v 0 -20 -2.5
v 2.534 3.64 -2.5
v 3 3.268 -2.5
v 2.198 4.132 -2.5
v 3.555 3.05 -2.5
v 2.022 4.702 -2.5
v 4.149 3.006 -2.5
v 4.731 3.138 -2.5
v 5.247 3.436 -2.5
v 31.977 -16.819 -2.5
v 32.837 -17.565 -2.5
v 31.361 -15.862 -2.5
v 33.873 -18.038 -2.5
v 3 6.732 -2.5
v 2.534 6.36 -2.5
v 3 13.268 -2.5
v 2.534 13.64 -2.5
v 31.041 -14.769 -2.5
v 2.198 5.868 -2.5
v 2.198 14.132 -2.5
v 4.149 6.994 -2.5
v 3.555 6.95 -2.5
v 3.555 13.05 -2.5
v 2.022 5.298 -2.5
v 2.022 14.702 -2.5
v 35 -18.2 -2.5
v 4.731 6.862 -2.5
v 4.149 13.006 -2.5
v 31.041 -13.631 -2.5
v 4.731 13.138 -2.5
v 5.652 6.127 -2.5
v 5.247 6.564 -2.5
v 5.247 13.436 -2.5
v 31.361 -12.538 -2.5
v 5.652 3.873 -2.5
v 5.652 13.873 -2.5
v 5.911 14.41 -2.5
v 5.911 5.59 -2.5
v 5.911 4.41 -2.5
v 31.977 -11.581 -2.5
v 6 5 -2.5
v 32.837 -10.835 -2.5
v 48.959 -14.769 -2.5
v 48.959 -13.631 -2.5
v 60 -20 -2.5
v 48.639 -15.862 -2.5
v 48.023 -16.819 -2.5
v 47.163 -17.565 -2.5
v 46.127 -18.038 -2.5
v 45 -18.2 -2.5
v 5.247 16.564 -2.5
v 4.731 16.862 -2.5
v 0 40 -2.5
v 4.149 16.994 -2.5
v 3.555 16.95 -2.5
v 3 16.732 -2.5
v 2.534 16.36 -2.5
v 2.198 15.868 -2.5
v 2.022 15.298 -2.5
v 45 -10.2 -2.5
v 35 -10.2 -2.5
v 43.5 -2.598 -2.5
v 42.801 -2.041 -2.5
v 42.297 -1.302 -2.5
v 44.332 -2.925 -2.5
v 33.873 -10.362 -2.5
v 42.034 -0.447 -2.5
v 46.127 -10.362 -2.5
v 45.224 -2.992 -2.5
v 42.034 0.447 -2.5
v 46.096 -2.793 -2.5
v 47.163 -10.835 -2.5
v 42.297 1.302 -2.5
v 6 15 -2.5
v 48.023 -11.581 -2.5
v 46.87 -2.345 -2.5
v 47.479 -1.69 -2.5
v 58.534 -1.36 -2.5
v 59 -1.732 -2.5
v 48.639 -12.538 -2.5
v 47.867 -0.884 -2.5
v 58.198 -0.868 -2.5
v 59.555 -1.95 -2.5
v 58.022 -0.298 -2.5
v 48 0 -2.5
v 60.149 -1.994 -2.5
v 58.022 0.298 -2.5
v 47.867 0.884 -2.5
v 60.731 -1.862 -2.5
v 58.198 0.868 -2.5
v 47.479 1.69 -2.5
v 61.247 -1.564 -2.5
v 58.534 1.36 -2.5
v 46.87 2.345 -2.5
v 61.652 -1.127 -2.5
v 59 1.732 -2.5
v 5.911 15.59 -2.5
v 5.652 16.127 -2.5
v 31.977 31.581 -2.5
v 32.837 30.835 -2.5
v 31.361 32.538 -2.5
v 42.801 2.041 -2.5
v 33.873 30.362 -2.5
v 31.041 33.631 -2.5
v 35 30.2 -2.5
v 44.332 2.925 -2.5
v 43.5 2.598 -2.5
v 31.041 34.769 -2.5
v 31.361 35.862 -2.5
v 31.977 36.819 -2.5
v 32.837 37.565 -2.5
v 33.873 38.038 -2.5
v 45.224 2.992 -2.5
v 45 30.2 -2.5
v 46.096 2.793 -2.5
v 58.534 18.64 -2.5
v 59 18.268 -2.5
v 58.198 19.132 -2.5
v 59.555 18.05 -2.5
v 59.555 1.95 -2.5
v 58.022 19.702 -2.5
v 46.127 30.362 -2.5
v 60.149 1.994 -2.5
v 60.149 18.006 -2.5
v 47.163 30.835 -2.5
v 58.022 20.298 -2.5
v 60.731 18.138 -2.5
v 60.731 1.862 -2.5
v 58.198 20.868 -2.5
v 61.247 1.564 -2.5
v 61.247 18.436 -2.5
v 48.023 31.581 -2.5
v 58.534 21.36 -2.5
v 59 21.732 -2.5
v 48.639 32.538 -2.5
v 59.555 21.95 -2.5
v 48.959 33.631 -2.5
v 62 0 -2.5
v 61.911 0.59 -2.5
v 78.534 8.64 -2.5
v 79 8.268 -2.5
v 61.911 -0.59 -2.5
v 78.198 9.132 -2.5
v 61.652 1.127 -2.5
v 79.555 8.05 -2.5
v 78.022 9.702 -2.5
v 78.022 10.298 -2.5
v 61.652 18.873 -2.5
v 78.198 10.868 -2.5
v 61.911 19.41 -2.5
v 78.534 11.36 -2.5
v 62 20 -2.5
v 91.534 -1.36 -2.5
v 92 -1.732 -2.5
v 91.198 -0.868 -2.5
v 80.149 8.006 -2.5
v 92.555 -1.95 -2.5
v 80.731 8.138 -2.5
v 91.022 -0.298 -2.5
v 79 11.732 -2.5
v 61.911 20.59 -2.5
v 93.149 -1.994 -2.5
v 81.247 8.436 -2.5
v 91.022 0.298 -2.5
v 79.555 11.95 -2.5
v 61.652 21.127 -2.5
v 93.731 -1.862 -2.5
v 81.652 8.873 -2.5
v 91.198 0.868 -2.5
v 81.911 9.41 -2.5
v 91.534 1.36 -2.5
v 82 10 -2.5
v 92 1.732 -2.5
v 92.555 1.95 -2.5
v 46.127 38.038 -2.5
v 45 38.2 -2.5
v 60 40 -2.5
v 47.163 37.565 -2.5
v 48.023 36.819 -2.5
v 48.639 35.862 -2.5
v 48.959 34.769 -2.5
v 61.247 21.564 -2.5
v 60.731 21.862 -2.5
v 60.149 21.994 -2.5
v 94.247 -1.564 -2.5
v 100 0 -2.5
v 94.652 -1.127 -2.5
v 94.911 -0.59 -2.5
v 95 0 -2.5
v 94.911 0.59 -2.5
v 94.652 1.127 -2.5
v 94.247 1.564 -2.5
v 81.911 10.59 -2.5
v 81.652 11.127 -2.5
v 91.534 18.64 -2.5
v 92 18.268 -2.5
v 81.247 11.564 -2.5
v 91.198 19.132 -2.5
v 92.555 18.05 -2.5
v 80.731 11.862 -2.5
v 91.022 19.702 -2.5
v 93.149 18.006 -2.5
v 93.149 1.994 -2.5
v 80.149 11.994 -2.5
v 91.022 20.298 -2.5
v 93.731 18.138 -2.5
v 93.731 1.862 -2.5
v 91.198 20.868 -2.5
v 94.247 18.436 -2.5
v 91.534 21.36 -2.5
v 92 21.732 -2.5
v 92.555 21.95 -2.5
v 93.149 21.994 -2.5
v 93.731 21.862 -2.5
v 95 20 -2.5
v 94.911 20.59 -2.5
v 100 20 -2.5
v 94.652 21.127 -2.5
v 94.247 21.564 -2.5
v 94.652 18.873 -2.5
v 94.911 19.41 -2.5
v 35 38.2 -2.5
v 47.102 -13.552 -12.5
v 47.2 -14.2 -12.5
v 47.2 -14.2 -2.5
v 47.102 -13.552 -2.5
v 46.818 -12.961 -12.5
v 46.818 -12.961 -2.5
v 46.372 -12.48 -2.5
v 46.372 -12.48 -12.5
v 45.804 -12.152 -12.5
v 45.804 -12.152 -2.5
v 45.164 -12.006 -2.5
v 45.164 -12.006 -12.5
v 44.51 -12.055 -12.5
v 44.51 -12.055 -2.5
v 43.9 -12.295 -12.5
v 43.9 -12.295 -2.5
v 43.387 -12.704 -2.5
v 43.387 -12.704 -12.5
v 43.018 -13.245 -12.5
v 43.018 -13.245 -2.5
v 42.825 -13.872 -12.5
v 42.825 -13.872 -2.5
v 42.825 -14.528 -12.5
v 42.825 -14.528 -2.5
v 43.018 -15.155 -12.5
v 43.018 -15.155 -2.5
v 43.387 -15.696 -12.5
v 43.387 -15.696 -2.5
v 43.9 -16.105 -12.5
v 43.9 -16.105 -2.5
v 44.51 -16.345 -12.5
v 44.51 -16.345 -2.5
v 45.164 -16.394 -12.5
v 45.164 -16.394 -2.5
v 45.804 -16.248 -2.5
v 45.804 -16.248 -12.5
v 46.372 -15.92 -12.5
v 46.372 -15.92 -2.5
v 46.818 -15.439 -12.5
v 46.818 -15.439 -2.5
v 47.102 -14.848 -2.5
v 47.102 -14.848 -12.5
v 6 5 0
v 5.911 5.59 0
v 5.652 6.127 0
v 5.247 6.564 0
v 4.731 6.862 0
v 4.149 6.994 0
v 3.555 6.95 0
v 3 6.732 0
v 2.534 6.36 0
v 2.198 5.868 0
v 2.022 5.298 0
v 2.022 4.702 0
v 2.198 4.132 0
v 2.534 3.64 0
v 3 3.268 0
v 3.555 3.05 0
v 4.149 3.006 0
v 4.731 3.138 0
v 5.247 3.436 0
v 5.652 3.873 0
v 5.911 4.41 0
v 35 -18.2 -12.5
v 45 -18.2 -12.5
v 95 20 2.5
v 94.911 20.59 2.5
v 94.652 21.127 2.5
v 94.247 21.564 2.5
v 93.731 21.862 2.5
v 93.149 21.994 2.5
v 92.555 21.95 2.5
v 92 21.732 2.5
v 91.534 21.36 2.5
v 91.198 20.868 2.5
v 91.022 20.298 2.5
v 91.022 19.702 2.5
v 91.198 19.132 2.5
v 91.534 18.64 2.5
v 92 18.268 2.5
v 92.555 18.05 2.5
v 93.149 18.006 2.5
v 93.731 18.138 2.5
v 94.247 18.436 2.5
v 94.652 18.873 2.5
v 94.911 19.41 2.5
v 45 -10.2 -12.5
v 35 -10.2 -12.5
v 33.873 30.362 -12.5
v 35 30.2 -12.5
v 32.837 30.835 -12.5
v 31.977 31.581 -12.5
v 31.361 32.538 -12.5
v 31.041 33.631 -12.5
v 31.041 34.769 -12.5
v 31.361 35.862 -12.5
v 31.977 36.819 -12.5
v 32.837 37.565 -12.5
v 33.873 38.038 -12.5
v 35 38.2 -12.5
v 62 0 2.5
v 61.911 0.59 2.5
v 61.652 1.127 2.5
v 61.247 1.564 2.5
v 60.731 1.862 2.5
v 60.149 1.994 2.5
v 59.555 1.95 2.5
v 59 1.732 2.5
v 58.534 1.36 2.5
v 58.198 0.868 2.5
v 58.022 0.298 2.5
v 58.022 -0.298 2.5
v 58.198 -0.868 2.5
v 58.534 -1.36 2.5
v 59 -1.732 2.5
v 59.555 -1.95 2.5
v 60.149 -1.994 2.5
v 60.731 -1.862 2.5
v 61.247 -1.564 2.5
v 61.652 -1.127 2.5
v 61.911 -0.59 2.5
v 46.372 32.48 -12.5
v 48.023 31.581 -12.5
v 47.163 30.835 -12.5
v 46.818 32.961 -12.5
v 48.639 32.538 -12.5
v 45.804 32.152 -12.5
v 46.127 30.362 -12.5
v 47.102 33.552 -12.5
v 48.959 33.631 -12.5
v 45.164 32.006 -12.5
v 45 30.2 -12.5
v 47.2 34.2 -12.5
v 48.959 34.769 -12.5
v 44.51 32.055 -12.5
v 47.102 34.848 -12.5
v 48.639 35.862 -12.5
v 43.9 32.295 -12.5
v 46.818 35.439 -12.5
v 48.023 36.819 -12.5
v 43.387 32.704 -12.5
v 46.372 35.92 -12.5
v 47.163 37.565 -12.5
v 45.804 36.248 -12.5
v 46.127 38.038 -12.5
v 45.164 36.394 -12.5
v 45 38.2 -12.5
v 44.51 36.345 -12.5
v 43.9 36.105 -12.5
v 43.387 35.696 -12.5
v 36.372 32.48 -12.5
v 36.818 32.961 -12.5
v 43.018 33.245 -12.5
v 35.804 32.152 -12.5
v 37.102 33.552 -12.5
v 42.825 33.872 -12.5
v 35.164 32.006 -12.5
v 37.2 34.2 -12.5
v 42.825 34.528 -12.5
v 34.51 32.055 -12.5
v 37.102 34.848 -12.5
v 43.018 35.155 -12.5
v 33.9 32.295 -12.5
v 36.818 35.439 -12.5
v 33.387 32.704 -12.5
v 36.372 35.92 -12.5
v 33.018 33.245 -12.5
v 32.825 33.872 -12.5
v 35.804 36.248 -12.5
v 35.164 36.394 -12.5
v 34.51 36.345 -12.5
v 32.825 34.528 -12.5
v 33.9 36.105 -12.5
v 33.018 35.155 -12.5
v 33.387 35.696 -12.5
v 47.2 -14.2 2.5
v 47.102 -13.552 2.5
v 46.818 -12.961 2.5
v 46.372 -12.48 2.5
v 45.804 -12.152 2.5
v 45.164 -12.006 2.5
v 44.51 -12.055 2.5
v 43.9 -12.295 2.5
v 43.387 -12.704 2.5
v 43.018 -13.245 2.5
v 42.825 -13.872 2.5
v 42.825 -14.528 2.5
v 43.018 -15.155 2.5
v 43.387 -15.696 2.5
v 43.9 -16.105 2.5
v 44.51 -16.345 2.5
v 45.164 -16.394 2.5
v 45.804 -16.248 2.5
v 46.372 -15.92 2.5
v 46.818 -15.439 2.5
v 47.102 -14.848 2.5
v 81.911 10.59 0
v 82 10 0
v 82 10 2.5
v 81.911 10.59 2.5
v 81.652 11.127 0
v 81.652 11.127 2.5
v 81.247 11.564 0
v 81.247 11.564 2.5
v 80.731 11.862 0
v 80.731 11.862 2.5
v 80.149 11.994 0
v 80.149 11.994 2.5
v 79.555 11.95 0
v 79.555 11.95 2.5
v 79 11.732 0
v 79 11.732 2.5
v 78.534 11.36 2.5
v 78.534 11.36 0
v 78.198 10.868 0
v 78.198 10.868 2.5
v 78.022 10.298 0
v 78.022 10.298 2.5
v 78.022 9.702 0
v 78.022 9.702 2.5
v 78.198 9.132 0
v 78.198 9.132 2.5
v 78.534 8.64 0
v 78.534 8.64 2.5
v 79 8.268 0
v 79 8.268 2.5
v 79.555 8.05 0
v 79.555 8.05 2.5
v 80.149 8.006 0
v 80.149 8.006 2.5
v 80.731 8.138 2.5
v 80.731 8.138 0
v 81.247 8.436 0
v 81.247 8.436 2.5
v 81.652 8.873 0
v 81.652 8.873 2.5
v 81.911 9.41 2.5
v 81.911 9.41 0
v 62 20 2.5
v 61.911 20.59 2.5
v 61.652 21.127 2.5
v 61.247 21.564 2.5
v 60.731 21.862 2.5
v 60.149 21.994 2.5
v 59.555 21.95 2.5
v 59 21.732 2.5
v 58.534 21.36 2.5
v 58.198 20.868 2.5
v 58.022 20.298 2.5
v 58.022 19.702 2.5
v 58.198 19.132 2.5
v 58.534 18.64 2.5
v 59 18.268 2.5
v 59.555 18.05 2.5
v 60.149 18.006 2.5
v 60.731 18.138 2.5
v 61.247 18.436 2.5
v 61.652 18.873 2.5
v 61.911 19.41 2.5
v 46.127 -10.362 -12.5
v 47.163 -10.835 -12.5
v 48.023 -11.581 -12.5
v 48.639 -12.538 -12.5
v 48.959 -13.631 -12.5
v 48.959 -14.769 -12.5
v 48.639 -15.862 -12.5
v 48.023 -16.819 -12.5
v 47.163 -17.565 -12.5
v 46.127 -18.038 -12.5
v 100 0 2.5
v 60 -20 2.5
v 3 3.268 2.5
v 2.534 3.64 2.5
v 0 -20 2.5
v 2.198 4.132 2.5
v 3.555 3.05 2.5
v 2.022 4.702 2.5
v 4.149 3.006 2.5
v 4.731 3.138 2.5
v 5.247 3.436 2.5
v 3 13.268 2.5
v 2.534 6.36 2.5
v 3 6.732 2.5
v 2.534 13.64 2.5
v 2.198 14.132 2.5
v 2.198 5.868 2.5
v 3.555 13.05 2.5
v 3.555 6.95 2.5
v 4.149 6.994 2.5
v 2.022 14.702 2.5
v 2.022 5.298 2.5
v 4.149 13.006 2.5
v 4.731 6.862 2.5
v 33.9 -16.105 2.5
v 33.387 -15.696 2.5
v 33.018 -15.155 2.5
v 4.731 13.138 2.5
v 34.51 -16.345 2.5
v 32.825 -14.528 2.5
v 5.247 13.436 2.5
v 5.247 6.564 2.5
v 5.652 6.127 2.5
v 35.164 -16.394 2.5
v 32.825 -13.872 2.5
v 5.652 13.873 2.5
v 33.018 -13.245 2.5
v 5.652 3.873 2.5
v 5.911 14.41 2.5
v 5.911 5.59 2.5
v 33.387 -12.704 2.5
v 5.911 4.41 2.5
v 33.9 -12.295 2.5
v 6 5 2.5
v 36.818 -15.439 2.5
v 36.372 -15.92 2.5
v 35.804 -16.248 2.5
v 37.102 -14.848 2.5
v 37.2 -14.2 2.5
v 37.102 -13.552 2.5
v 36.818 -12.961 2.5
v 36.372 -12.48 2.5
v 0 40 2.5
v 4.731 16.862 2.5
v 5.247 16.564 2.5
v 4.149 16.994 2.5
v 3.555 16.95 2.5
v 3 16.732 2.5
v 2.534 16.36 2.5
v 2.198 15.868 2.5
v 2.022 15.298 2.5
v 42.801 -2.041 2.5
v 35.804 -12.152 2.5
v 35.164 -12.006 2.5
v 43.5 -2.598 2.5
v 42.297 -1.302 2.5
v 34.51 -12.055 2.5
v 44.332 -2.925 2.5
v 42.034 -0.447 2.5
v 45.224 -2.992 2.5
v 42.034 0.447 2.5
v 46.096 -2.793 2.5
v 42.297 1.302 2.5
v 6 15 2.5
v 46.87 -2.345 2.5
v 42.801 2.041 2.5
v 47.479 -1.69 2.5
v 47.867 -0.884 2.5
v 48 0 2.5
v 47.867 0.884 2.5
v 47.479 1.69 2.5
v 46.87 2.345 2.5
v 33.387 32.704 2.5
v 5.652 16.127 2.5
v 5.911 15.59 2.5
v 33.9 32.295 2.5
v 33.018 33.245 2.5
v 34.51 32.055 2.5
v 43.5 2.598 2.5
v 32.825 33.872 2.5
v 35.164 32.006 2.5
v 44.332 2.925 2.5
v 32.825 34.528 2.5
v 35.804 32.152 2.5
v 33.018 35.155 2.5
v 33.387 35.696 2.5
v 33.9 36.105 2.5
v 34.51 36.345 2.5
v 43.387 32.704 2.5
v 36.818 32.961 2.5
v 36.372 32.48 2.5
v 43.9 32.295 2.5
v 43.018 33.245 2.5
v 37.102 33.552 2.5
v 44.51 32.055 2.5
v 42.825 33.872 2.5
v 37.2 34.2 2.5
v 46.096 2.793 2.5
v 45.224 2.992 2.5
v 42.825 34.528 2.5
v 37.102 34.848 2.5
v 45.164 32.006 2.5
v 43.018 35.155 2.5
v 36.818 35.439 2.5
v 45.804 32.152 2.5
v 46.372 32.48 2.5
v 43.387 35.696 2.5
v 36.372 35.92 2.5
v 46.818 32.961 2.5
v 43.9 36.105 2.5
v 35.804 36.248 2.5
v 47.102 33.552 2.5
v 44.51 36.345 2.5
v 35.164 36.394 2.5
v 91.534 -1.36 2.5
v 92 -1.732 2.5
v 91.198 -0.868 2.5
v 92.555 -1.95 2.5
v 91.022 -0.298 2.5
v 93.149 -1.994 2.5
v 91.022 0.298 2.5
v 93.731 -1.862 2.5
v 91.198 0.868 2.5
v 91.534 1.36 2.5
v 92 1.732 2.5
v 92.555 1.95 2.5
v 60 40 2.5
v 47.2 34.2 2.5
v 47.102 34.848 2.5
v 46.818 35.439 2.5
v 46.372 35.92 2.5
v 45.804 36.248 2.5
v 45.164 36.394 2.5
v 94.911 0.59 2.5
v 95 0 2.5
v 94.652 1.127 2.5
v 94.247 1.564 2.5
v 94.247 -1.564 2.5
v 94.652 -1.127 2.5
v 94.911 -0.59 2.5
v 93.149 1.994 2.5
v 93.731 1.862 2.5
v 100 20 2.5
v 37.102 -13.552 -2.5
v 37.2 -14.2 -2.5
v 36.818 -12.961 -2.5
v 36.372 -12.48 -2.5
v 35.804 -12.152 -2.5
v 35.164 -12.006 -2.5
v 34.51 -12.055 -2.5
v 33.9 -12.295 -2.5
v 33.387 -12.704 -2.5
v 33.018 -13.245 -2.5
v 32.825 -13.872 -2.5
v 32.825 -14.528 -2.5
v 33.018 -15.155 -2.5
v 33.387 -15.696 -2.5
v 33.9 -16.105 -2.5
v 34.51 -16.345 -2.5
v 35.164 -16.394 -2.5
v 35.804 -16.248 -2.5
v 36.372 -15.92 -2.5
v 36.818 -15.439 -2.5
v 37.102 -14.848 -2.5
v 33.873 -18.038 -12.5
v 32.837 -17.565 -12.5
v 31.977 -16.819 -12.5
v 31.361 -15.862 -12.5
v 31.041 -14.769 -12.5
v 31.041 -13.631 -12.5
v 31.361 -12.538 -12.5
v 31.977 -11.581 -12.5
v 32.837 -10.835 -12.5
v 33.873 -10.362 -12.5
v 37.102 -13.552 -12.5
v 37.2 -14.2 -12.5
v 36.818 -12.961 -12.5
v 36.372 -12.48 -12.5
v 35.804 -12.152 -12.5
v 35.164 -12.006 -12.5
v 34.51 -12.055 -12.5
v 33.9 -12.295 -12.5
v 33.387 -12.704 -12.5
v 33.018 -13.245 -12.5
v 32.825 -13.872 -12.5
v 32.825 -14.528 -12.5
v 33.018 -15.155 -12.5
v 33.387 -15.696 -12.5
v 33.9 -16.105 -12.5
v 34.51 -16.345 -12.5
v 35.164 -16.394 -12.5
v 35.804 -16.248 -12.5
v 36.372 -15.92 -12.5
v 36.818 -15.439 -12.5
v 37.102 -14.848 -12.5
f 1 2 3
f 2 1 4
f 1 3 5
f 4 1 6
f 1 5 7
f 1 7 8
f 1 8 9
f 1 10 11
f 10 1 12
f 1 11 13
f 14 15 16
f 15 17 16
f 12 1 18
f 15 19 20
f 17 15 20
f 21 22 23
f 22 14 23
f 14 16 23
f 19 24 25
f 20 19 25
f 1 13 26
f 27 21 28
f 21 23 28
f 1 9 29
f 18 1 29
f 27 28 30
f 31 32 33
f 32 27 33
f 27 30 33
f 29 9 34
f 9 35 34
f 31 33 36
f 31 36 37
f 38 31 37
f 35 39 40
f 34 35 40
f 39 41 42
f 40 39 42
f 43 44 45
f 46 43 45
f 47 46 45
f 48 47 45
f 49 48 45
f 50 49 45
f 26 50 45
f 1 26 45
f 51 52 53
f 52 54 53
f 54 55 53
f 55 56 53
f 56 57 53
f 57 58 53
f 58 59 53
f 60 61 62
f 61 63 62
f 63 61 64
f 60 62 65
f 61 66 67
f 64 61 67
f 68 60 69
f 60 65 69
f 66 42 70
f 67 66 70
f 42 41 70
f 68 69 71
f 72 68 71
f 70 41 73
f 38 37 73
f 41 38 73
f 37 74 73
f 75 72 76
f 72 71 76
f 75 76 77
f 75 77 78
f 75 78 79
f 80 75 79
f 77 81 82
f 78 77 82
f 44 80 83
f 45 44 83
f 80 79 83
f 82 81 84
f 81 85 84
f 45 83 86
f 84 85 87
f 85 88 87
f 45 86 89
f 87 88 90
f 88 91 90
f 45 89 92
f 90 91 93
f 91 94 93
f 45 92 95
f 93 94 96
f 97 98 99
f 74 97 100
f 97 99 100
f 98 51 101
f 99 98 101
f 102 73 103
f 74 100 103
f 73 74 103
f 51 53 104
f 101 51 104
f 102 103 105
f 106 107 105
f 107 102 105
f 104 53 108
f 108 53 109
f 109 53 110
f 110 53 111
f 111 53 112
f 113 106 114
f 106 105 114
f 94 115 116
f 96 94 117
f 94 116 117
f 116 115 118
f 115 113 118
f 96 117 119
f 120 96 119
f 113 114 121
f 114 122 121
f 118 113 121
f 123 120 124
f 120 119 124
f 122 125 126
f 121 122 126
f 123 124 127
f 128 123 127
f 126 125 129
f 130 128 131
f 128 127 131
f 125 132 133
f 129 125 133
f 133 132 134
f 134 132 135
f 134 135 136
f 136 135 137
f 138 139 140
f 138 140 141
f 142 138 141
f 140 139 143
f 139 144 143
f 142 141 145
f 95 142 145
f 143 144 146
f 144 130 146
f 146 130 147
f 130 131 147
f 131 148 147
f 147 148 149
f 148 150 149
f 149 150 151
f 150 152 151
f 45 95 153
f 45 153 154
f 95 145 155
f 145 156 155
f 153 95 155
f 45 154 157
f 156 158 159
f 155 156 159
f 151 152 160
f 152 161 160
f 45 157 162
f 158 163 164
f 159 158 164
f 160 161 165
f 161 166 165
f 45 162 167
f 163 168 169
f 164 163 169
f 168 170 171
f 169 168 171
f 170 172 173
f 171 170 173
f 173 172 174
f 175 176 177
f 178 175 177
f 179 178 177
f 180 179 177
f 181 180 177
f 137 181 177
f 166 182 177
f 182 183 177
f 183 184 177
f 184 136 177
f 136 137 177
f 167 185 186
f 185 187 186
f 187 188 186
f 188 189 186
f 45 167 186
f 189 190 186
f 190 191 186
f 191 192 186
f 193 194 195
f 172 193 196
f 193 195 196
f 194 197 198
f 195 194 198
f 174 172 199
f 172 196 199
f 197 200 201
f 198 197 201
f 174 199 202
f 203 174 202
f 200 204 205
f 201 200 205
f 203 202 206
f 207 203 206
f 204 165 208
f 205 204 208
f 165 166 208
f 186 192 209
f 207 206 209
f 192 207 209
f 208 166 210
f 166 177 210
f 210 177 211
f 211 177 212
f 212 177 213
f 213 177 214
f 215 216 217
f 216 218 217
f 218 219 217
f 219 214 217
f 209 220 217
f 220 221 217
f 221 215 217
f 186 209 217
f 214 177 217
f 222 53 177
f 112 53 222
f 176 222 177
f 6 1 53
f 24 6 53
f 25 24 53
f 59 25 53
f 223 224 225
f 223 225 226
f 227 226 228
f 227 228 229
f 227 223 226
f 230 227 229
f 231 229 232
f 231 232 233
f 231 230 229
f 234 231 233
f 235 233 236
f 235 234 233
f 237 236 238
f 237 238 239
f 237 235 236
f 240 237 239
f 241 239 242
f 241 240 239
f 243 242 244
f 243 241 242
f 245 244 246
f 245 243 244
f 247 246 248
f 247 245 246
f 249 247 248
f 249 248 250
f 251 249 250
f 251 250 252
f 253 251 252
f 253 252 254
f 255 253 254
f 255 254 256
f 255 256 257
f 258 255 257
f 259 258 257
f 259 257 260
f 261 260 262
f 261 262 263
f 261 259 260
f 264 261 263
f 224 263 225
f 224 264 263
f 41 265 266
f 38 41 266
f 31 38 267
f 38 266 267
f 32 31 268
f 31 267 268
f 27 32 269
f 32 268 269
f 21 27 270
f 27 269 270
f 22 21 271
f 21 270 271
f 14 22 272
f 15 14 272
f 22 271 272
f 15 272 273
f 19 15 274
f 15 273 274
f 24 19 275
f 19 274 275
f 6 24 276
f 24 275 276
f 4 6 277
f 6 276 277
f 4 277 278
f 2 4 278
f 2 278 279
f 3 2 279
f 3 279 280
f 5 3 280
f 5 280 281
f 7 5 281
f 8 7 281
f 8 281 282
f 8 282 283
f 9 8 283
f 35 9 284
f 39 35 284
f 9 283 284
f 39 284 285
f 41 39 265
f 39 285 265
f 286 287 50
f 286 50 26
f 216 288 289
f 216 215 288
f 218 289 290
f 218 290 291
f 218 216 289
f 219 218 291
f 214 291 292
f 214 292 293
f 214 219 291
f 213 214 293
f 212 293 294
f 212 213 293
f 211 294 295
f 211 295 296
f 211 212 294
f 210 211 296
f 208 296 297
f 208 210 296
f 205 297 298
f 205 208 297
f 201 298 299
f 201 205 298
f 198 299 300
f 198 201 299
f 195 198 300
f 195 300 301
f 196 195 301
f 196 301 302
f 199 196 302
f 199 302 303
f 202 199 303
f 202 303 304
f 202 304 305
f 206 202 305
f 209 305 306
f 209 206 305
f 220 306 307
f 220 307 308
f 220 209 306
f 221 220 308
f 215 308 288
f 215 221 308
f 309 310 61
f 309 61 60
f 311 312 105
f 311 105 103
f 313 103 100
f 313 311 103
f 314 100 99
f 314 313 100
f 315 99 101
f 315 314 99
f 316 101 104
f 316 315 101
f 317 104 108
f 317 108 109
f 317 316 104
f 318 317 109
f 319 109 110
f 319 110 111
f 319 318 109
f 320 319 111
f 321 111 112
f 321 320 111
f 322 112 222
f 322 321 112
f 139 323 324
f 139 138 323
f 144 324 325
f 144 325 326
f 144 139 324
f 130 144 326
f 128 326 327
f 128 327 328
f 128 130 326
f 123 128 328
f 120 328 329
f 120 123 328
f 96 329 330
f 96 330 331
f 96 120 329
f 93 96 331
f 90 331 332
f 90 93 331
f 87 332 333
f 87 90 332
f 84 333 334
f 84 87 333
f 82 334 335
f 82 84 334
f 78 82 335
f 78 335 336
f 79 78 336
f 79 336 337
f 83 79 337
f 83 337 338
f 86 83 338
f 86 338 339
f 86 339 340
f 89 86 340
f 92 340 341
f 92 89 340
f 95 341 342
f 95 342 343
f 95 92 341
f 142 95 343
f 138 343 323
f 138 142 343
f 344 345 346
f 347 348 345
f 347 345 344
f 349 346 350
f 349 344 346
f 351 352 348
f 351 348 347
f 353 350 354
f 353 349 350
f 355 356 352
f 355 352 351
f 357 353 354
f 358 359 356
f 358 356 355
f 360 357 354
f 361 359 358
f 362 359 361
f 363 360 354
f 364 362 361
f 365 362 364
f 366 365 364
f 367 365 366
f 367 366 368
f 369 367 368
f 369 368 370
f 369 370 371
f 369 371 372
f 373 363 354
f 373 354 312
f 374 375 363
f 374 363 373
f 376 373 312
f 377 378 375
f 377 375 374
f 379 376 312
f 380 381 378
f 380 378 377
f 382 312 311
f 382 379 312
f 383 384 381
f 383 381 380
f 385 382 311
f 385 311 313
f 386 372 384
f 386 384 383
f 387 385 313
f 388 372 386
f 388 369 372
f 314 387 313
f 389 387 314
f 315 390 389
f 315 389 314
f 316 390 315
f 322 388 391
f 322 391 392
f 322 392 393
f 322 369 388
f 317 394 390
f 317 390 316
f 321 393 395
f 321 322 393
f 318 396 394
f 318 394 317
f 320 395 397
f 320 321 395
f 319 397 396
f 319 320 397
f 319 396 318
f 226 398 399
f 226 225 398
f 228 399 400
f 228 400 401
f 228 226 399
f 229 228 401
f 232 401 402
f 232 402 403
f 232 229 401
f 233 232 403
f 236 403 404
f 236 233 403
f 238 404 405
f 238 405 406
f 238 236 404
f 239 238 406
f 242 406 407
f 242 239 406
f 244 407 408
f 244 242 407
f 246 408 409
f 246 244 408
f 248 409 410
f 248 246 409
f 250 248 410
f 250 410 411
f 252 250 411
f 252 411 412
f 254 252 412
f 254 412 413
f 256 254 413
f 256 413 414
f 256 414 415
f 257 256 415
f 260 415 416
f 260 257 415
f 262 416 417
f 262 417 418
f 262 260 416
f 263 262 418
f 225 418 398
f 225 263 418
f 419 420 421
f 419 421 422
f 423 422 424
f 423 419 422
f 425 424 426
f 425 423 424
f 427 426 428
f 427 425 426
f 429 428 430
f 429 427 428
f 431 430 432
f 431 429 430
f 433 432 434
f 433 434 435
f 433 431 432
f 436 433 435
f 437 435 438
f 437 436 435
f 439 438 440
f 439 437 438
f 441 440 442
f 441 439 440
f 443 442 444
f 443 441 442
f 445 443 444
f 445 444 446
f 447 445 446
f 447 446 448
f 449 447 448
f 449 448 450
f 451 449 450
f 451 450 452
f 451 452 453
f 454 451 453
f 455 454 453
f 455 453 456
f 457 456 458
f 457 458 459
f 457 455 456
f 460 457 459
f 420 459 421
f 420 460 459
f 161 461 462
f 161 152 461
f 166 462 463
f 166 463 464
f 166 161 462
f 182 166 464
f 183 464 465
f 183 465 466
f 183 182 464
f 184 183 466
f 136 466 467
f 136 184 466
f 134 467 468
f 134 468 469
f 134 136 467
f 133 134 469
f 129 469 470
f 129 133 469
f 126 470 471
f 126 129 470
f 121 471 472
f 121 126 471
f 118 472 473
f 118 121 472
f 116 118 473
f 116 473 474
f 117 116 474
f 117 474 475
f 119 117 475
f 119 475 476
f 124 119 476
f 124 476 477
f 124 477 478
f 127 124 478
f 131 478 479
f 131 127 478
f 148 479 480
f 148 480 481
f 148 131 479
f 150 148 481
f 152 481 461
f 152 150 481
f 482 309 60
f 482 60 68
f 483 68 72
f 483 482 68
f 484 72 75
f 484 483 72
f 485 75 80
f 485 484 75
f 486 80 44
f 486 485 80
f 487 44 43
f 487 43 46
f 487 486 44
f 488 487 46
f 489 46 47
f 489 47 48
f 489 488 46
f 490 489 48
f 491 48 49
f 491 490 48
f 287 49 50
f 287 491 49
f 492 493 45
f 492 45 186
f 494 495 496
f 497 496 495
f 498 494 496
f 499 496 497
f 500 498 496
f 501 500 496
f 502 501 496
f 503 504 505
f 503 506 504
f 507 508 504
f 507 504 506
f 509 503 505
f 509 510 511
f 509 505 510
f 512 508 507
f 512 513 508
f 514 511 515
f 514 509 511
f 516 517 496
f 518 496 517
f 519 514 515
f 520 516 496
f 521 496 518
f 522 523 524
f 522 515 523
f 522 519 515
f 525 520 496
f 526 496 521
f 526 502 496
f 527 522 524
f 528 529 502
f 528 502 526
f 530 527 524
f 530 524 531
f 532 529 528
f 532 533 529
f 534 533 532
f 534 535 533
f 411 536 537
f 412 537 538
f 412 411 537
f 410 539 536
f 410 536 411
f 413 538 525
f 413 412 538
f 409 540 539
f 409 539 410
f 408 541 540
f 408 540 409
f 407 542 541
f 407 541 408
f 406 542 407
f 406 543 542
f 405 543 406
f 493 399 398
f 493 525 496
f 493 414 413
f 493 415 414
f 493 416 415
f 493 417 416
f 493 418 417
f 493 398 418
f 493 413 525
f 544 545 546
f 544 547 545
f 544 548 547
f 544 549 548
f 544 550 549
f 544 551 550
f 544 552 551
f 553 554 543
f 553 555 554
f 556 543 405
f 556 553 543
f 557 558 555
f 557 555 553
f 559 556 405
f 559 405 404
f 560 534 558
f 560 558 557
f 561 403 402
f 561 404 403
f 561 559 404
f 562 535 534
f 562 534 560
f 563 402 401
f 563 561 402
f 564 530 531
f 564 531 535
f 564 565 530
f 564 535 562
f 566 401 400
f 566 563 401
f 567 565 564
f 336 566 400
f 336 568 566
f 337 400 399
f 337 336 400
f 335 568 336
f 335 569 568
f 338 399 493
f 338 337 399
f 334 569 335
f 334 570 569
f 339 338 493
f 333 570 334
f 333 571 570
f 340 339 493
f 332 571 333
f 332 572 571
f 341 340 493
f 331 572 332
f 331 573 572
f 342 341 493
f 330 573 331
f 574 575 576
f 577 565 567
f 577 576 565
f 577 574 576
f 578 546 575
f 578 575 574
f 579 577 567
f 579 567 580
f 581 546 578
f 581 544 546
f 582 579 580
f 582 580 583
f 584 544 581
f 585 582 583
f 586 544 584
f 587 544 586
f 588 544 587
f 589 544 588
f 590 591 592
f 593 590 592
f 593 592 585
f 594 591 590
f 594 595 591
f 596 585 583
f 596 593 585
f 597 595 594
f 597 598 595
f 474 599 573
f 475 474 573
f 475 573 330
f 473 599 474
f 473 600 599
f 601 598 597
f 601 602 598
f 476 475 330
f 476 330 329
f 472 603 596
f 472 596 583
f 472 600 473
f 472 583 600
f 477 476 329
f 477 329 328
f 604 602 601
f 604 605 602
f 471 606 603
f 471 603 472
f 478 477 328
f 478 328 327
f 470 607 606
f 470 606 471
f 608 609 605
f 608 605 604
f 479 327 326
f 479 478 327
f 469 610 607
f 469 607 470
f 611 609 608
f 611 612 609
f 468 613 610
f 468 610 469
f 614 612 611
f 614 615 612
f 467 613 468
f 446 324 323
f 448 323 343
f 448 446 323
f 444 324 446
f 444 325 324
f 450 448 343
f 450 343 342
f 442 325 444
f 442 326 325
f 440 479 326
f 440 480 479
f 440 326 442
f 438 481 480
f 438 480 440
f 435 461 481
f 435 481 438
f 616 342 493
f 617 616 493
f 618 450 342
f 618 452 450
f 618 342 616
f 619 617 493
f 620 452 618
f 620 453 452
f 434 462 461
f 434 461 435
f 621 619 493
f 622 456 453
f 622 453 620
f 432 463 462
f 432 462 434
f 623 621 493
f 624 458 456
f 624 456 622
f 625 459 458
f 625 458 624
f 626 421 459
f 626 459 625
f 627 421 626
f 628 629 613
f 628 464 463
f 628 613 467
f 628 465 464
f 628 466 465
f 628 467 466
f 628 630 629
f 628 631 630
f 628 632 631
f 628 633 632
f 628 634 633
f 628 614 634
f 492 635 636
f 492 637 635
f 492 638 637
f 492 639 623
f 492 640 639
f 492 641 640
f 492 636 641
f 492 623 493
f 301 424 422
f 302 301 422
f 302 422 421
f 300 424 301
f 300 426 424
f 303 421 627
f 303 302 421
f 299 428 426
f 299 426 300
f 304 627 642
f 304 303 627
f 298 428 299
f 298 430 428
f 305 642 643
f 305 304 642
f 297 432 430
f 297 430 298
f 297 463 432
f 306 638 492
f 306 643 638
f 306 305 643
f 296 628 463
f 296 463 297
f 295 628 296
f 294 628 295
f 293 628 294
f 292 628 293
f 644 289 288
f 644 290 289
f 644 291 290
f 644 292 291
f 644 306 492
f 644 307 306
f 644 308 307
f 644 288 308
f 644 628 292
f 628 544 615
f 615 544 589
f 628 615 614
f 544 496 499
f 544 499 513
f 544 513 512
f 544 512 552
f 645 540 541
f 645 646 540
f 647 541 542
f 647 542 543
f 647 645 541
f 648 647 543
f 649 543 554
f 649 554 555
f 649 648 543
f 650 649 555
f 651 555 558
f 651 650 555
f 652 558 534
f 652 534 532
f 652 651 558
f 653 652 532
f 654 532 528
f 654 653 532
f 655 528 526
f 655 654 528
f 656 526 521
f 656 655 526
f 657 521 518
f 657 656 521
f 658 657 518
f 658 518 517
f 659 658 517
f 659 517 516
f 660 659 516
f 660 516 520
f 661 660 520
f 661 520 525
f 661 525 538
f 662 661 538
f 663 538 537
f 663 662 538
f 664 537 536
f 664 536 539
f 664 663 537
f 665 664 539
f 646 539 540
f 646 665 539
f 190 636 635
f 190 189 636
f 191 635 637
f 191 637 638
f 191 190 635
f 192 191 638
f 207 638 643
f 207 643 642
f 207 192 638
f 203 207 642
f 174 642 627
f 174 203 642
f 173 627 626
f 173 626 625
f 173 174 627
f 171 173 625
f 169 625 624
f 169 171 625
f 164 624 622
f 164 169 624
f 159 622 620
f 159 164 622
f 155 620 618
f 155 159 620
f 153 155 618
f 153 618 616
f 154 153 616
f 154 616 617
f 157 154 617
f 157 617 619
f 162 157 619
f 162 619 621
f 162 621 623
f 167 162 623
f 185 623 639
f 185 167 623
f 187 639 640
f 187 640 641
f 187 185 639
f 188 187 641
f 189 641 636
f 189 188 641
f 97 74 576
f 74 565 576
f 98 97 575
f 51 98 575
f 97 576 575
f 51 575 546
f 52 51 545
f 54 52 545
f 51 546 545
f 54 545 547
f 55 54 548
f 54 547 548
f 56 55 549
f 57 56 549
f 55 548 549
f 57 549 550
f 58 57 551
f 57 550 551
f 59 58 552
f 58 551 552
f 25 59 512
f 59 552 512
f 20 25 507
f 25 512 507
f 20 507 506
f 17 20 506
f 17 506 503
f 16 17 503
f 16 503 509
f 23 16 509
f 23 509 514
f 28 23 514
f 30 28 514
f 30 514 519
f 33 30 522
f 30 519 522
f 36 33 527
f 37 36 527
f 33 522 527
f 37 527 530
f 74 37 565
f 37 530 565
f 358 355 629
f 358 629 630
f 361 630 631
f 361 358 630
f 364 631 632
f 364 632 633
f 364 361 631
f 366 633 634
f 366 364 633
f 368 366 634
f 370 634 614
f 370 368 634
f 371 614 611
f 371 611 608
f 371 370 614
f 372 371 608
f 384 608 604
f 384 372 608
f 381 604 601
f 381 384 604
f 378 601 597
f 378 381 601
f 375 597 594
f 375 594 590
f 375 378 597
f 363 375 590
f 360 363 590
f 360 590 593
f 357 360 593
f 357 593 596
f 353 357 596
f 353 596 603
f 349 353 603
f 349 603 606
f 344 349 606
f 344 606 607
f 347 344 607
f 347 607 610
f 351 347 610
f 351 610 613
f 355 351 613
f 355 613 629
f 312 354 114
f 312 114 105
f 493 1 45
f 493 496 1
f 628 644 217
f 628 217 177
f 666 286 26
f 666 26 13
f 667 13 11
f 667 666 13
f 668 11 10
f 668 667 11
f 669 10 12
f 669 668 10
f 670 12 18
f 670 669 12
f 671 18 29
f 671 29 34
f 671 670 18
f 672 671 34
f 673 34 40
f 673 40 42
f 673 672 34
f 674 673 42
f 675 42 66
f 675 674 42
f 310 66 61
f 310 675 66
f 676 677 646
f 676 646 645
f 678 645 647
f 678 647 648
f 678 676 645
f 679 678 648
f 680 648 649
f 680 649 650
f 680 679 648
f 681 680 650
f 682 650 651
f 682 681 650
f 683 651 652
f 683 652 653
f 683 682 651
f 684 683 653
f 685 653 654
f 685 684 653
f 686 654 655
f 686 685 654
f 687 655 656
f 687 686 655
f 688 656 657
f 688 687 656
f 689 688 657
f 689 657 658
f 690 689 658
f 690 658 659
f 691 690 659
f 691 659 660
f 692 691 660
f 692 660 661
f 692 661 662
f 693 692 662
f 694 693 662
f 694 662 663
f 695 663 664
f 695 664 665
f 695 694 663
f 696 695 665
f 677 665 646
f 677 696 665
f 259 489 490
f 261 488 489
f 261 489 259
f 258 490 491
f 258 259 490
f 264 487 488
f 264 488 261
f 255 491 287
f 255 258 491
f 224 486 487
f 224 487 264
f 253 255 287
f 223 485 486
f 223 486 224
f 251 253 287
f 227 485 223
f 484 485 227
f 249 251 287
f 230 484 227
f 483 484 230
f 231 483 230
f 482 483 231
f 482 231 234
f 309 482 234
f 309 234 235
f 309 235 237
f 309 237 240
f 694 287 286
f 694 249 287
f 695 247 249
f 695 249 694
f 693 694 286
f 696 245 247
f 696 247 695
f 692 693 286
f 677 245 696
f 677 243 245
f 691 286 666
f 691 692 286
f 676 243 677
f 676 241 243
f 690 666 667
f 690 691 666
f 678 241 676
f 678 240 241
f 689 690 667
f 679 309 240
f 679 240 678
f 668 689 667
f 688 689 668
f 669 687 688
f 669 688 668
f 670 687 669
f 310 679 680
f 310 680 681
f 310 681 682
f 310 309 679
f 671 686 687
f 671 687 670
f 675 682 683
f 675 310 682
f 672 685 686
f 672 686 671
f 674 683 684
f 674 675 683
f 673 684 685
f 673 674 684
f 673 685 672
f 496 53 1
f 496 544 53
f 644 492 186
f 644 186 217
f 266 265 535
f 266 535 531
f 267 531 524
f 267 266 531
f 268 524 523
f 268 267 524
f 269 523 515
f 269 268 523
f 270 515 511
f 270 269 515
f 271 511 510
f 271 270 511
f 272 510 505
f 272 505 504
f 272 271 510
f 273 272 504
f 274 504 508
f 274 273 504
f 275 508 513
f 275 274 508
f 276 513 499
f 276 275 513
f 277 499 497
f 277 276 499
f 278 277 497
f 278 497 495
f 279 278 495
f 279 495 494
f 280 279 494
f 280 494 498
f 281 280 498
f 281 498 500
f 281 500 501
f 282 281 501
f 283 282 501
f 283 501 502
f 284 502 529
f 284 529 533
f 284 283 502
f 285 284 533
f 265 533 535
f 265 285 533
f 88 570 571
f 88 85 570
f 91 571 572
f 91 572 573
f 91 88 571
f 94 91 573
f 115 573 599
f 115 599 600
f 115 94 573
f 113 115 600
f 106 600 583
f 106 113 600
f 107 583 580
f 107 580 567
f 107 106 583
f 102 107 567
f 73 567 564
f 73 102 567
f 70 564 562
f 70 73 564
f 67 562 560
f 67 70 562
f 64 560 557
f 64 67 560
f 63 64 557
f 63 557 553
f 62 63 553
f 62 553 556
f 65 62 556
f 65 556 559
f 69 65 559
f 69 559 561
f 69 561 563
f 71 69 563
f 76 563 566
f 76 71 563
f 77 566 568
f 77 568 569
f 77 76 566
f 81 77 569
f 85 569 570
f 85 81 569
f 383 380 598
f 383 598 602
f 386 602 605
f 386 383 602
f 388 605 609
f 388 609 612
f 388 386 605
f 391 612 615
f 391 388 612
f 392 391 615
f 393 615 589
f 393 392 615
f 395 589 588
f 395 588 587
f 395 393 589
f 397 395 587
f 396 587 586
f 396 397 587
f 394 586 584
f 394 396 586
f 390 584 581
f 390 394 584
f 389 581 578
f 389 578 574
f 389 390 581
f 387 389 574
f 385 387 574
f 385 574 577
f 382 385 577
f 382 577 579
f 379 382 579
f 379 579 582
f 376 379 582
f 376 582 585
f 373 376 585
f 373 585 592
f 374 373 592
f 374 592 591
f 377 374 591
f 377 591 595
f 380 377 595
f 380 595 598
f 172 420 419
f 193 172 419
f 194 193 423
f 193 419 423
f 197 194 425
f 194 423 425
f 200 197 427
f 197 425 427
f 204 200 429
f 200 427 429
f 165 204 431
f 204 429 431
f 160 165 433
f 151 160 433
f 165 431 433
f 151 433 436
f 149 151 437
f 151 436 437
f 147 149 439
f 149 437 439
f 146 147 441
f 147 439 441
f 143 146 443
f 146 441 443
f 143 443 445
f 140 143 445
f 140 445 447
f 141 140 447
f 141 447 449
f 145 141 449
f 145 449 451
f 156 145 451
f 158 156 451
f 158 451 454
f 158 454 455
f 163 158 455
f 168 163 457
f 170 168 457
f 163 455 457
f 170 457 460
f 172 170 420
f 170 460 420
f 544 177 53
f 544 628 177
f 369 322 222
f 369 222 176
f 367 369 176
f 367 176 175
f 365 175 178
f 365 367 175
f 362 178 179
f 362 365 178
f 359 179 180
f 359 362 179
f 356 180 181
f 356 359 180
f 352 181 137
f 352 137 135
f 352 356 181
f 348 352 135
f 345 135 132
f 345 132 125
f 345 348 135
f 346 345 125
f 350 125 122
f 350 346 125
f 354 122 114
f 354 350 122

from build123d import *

# Parameters (mm, degrees)
SKETCH_1_R          = 2
SKETCH_1_R_2        = 3
SKETCH_1_R_3        = 2.2
EXTRUDE_1_DEPTH     = 2.5
SKETCH_2_R          = 2
CUT_EXTRUDE_1_DEPTH = 2.5
EXTRUDE_START       = -15
SKETCH_3_R          = 2.2
EXTRUDE_2_DEPTH     = 10


with BuildPart() as part:
    # 草图1 → 凸台-拉伸1 (new, symmetric)
    with BuildSketch(Plane.XY):
        Polygon((0, -20), (60, -20), (100, 0), (100, 20), (60, 40), (0, 40), align=None)
        with Locations((60, 20)):
            Circle(SKETCH_1_R, mode=Mode.SUBTRACT)
        with Locations((60, 0)):
            Circle(SKETCH_1_R, mode=Mode.SUBTRACT)
        with Locations((93, 20)):
            Circle(SKETCH_1_R, mode=Mode.SUBTRACT)
        with Locations((93, 0)):
            Circle(SKETCH_1_R, mode=Mode.SUBTRACT)
        with Locations((45, 0)):
            Circle(SKETCH_1_R_2, mode=Mode.SUBTRACT)
        with Locations((45, 34.2)):
            Circle(SKETCH_1_R_3, mode=Mode.SUBTRACT)
        with Locations((45, -14.2)):
            Circle(SKETCH_1_R_3, mode=Mode.SUBTRACT)
        with Locations((35, 34.2)):
            Circle(SKETCH_1_R_3, mode=Mode.SUBTRACT)
        with Locations((35, -14.2)):
            Circle(SKETCH_1_R_3, mode=Mode.SUBTRACT)
    extrude(amount=EXTRUDE_1_DEPTH, both=True)

    # 草图2 → 切除-拉伸1 (cut, symmetric)
    with BuildSketch(Plane.XY):
        with Locations((80, 10)):
            Circle(SKETCH_2_R)
        with Locations((4, 5)):
            Circle(SKETCH_2_R)
        with Locations((4, 15)):
            Circle(SKETCH_2_R)
    extrude(amount=CUT_EXTRUDE_1_DEPTH, both=True, mode=Mode.SUBTRACT)

    # 草图3 → 凸台-拉伸2 (add)
    # profile 1 of 2: a face of its own
    with BuildSketch(Plane.XY.offset(2.5).offset(EXTRUDE_START)):
        with BuildLine():
            Line((35, 38.2), (45, 38.2))
            ThreePointArc((45, 38.2), (49, 34.2), (45, 30.2))
            Line((45, 30.2), (35, 30.2))
            ThreePointArc((35, 30.2), (31, 34.2), (35, 38.2))
        make_face()
        with Locations((35, 34.2)):
            Circle(SKETCH_3_R, mode=Mode.SUBTRACT)
        with Locations((45, 34.2)):
            Circle(SKETCH_3_R, mode=Mode.SUBTRACT)
    # profile 2 of 2: a face of its own
    with BuildSketch(Plane.XY.offset(2.5).offset(EXTRUDE_START)):
        with BuildLine():
            Line((35, -10.2), (45, -10.2))
            ThreePointArc((45, -10.2), (49, -14.2), (45, -18.2))
            Line((45, -18.2), (35, -18.2))
            ThreePointArc((35, -18.2), (31, -14.2), (35, -10.2))
        make_face()
        with Locations((35, -14.2)):
            Circle(SKETCH_3_R, mode=Mode.SUBTRACT)
        with Locations((45, -14.2)):
            Circle(SKETCH_3_R, mode=Mode.SUBTRACT)
    extrude(amount=EXTRUDE_2_DEPTH)


solid = part.part
